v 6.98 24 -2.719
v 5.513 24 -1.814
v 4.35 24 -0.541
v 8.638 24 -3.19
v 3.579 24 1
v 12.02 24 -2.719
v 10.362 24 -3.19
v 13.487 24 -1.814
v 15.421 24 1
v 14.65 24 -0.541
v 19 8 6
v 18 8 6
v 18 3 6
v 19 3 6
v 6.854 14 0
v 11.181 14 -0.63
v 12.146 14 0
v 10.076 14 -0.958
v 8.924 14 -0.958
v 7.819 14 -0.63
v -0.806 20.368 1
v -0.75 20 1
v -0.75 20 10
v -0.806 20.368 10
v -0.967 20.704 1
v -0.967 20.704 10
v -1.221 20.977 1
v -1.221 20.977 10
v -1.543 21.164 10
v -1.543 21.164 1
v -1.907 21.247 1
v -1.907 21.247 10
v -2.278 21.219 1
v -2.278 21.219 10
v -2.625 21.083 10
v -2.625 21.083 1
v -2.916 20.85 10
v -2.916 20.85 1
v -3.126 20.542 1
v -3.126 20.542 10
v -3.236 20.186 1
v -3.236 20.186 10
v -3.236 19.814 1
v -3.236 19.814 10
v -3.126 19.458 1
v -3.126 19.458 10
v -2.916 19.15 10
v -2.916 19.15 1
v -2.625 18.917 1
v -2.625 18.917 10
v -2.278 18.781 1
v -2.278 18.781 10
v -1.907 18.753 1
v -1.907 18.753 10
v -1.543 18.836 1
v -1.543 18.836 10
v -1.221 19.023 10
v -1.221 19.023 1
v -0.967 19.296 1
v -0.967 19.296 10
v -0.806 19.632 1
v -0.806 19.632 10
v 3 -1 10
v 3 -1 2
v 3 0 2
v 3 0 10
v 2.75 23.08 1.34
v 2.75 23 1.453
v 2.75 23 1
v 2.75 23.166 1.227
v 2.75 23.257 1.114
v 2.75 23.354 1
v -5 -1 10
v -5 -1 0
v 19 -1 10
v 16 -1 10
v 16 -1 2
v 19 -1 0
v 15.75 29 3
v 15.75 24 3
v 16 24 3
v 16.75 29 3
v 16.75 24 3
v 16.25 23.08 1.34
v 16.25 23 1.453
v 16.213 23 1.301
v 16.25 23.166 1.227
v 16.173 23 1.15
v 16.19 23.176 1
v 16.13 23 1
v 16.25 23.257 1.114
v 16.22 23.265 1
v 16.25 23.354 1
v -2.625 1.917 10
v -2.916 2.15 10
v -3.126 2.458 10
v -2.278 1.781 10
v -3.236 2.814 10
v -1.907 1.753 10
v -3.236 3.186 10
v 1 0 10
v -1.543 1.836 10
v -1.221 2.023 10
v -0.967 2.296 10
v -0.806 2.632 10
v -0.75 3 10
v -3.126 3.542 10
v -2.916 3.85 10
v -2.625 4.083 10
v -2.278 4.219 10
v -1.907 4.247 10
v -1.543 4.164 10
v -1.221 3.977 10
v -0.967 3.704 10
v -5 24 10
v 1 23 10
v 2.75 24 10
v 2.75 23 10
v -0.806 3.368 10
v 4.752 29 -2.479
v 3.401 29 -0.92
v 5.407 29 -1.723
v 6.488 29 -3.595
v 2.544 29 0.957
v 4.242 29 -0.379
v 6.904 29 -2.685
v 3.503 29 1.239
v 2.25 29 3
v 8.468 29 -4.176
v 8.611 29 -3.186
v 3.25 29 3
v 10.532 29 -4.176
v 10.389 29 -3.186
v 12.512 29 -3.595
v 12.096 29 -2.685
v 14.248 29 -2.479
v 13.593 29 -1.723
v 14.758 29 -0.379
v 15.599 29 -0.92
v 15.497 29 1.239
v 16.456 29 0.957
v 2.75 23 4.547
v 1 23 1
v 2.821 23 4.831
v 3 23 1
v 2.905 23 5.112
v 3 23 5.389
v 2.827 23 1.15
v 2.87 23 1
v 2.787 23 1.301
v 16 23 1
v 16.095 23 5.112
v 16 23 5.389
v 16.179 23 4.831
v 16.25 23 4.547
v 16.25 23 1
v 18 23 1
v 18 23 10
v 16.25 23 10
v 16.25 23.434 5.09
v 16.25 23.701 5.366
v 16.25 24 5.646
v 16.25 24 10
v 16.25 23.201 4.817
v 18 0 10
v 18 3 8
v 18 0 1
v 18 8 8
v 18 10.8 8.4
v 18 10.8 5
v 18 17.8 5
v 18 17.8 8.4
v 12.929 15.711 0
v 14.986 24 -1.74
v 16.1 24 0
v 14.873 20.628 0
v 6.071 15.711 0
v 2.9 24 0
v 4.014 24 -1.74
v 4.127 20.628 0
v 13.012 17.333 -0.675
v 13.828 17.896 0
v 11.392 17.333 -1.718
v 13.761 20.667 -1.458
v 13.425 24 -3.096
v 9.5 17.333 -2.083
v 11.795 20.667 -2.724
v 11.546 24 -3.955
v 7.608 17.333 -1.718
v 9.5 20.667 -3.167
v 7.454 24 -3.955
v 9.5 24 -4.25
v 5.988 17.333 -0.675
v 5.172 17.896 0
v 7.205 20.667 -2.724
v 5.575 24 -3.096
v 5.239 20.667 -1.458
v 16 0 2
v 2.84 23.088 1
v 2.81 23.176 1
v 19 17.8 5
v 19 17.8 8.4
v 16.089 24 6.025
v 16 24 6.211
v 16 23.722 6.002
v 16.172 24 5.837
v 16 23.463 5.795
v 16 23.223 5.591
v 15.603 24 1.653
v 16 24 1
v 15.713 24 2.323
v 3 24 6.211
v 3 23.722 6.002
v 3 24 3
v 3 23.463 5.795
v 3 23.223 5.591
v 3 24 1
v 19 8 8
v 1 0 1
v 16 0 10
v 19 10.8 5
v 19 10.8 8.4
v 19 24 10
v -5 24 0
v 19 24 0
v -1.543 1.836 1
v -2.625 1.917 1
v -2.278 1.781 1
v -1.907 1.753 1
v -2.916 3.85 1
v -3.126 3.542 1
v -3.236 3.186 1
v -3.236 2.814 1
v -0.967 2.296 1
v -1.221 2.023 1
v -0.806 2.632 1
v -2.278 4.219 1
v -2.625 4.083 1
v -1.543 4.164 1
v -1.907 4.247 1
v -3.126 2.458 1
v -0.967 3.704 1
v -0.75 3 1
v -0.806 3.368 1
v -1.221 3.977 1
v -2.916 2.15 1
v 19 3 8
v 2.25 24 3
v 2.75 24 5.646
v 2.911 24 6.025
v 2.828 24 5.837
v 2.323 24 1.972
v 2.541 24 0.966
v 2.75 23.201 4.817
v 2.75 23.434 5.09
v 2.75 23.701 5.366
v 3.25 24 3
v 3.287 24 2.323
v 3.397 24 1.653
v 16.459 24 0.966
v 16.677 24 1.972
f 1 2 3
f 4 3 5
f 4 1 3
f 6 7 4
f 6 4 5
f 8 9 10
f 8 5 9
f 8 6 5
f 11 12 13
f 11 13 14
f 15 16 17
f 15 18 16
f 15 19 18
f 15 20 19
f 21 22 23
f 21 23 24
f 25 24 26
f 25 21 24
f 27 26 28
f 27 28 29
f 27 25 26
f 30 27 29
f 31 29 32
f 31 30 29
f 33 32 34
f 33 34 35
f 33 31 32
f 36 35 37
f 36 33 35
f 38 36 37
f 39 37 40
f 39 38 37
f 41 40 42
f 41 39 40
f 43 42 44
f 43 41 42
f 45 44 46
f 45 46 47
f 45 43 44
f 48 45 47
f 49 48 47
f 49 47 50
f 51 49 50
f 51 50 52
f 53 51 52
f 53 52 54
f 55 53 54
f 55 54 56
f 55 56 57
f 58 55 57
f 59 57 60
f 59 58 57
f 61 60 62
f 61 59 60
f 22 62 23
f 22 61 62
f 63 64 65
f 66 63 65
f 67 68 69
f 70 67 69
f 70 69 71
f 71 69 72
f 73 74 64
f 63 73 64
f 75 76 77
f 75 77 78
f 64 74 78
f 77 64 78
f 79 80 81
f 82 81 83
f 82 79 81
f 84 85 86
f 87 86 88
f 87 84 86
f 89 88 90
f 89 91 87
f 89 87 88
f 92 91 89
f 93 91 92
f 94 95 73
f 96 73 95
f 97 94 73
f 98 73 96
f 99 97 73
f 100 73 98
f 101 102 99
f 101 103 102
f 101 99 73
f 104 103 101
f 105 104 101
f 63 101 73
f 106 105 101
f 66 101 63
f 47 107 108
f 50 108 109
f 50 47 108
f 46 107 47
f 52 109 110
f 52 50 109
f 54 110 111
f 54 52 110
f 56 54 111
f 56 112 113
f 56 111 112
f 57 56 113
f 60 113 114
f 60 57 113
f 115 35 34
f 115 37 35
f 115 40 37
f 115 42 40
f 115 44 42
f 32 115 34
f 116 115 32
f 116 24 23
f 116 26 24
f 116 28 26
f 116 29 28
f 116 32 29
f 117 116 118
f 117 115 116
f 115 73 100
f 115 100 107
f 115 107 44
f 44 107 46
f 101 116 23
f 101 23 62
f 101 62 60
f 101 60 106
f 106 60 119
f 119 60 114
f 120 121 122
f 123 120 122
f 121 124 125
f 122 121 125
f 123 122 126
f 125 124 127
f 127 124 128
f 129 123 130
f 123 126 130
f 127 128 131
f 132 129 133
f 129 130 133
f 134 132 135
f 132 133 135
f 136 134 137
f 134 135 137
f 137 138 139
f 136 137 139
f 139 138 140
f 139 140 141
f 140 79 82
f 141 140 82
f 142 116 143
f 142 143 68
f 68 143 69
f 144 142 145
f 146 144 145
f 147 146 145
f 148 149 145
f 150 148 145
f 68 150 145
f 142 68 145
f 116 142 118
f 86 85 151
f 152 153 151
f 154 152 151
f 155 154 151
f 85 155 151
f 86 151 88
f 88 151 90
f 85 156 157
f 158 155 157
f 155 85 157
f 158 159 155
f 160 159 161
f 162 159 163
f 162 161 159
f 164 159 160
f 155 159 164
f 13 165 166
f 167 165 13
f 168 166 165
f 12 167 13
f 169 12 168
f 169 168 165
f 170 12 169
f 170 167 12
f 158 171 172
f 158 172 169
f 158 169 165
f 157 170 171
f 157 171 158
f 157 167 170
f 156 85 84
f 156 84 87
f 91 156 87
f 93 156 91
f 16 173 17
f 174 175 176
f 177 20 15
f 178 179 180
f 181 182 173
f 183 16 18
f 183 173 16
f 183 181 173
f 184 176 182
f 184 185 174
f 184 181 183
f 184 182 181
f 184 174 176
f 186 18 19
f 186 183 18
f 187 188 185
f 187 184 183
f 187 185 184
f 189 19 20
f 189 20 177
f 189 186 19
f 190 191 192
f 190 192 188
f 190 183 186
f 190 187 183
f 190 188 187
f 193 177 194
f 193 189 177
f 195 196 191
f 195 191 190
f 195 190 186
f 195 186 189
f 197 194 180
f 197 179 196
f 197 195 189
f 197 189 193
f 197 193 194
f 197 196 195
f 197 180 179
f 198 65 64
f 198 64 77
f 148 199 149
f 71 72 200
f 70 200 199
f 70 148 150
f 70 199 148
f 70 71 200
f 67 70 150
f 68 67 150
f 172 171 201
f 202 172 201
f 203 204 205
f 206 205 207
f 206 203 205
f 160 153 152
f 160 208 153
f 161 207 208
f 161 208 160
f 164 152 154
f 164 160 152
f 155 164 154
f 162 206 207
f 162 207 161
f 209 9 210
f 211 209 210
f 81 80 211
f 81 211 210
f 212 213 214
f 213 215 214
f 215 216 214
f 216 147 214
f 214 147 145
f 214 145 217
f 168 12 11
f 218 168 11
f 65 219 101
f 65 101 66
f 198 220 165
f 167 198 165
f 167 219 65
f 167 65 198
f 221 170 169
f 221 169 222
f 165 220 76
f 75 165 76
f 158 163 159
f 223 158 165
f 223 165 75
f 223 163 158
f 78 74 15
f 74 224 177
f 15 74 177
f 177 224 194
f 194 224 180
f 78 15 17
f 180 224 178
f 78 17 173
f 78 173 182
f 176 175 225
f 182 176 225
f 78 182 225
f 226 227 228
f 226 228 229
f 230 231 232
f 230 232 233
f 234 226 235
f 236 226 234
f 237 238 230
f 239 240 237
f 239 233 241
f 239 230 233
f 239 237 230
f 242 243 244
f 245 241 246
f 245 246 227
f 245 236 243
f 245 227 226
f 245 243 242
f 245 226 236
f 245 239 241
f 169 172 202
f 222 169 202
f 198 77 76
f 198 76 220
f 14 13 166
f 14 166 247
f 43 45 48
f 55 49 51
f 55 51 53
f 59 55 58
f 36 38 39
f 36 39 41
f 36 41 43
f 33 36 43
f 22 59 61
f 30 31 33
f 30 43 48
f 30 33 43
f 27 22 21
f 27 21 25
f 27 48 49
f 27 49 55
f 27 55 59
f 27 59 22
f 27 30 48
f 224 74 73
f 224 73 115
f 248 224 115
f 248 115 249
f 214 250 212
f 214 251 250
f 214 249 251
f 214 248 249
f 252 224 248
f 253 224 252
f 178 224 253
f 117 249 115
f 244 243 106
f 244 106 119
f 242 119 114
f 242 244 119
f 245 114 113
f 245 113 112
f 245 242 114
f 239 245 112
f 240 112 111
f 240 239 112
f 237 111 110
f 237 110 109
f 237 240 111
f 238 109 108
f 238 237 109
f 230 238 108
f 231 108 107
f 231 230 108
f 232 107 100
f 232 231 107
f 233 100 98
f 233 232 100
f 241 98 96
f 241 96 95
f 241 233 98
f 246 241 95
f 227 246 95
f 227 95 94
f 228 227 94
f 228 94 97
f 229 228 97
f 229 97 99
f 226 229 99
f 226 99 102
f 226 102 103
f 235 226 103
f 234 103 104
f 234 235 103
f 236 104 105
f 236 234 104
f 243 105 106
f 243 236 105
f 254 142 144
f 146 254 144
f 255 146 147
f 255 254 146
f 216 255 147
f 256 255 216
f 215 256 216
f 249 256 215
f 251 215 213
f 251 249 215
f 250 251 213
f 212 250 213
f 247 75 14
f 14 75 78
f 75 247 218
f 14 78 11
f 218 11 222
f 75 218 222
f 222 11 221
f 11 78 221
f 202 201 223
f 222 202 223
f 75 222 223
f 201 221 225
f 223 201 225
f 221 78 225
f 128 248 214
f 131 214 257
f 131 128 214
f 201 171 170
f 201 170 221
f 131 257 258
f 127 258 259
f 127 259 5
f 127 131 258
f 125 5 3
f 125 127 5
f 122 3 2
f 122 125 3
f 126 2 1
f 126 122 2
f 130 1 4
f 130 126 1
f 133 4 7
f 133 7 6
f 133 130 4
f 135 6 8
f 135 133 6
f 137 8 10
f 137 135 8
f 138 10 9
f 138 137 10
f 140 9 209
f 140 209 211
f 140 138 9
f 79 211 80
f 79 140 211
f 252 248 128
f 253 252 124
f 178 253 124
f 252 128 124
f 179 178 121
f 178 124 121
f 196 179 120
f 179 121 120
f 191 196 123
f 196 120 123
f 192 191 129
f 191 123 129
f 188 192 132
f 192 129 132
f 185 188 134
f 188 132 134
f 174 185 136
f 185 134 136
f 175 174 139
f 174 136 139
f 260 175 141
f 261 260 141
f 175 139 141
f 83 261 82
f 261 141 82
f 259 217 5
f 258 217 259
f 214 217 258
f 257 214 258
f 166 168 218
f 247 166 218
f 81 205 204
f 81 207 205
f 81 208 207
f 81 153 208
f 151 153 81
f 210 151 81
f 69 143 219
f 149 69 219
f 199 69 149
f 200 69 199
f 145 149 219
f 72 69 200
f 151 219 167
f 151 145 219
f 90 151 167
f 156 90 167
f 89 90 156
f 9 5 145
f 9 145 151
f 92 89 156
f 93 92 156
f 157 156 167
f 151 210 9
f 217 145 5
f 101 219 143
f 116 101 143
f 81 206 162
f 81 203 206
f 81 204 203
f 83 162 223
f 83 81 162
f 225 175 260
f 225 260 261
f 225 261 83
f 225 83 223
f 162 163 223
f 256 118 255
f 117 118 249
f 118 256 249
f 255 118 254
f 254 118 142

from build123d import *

# Parameters (mm, degrees)
CYLINDER003_R     = 1.25
CYLINDER003_DEPTH = 9
CYLINDER002_R     = 1.25
CYLINDER002_DEPTH = 9
BOX008_W          = 5
BOX008_H          = 25
BOX008_DEPTH      = 10
BOX009_W          = 5
BOX009_H          = 5
BOX009_DEPTH      = 2
BOX005_W          = 20
BOX005_H          = 10
BOX005_DEPTH      = 10
CYLINDER_R        = 6.25
CYLINDER_DEPTH    = 5
CYLINDER001_R     = 7.25
CYLINDER001_DEPTH = 5
BOX004_W          = 6.5
BOX004_H          = 7
BOX004_DEPTH      = 10
BOX002_W          = 13.5
BOX002_H          = 10
BOX002_DEPTH      = 12
BOX003_W          = 13
BOX003_H          = 13
BOX003_DEPTH      = 12
BOX_W             = 17
BOX_H             = 23
BOX_DEPTH         = 12
BOX001_W          = 19
BOX001_H          = 25
BOX001_DEPTH      = 10
BOX007_W          = 13
BOX007_H          = 10
BOX007_DEPTH      = 10
BOX006_W          = 15
BOX006_H          = 10
BOX006_DEPTH      = 10
BOX010_W          = 1
BOX010_H          = 10
BOX010_DEPTH      = 1.6


with BuildPart() as cylinder003:
    # Cylinder003 → Cylinder003 (new body)
    with BuildSketch(Plane(origin=(-2, 20, 1), x_dir=(1, 0, 0), z_dir=(0, 0, 1))):
        Circle(CYLINDER003_R)
    extrude(amount=CYLINDER003_DEPTH)


with BuildPart() as cylinder002:
    # Cylinder002 → Cylinder002 (new body)
    with BuildSketch(Plane(origin=(-2, 3, 1), x_dir=(1, 0, 0), z_dir=(0, 0, 1))):
        Circle(CYLINDER002_R)
    extrude(amount=CYLINDER002_DEPTH)


with BuildPart() as cube008:
    # Box008 → Box008 (new body)
    with BuildSketch(Plane(origin=(-5, -1, 0), x_dir=(1, 0, 0), z_dir=(0, 0, 1))):
        with Locations((2.5, 12.5)):
            Rectangle(BOX008_W, BOX008_H)
    extrude(amount=BOX008_DEPTH)


with BuildPart() as cube009:
    # Box009 → Box009 (new body)
    with BuildSketch(Plane(origin=(15, 3, 6), x_dir=(1, 0, 0), z_dir=(0, 0, 1))):
        with Locations((2.5, 2.5)):
            Rectangle(BOX009_W, BOX009_H)
    extrude(amount=BOX009_DEPTH)


with BuildPart() as cube005:
    # Box005 → Box005 (new body)
    with BuildSketch(Plane(origin=(0, 24, 3), x_dir=(1, 0, 0), z_dir=(0, 0, 1))):
        with Locations((10, 5)):
            Rectangle(BOX005_W, BOX005_H)
    extrude(amount=BOX005_DEPTH)


with BuildPart() as cylinder:
    # Cylinder → Cylinder (new body)
    with BuildSketch(Plane(origin=(9.5, 29, 3), x_dir=(1, 0, 0), z_dir=(0, -1, 0))):
        Circle(CYLINDER_R)
    extrude(amount=CYLINDER_DEPTH)


with BuildPart() as cut005:
    # Cylinder001 → Cylinder001 (new body)
    with BuildSketch(Plane(origin=(9.5, 29, 3), x_dir=(1, 0, 0), z_dir=(0, -1, 0))):
        Circle(CYLINDER001_R)
    extrude(amount=CYLINDER001_DEPTH)

    # Cut004: cut Cylinder
    add(cylinder.part, mode=Mode.SUBTRACT)

    # Cut005: cut Cube005
    add(cube005.part, mode=Mode.SUBTRACT)


with BuildPart() as cube004:
    # Box004 → Box004 (new body)
    with BuildSketch(Plane(origin=(15, 10.8, 5), x_dir=(1, 0, 0), z_dir=(0, 0, 1))):
        with Locations((3.25, 3.5)):
            Rectangle(BOX004_W, BOX004_H)
    extrude(amount=BOX004_DEPTH)


with BuildPart() as cube002:
    # Box002 → Box002 (new body)
    with BuildSketch(Plane(origin=(2.75, 15, 1), x_dir=(1, 0, 0), z_dir=(0, 0, 1))):
        with Locations((6.75, 5)):
            Rectangle(BOX002_W, BOX002_H)
    extrude(amount=BOX002_DEPTH)


with BuildPart() as cube003:
    # Box003 → Box003 (new body)
    with BuildSketch(Plane(origin=(3, -1, 2), x_dir=(1, 0, 0), z_dir=(0, 0, 1))):
        with Locations((6.5, 6.5)):
            Rectangle(BOX003_W, BOX003_H)
    extrude(amount=BOX003_DEPTH)


with BuildPart() as cube:
    # Box → Box (new body)
    with BuildSketch(Plane(origin=(1, 0, 1), x_dir=(1, 0, 0), z_dir=(0, 0, 1))):
        with Locations((8.5, 11.5)):
            Rectangle(BOX_W, BOX_H)
    extrude(amount=BOX_DEPTH)


with BuildPart() as fusion:
    # Box001 → Box001 (new body)
    with BuildSketch(Plane(origin=(0, -1, 0), x_dir=(1, 0, 0), z_dir=(0, 0, 1))):
        with Locations((9.5, 12.5)):
            Rectangle(BOX001_W, BOX001_H)
    extrude(amount=BOX001_DEPTH)

    # Cut: cut Cube
    add(cube.part, mode=Mode.SUBTRACT)

    # Cut001: cut Cube003
    add(cube003.part, mode=Mode.SUBTRACT)

    # Cut002: cut Cube002
    add(cube002.part, mode=Mode.SUBTRACT)

    # Cut003: cut Cube004
    add(cube004.part, mode=Mode.SUBTRACT)

    # Fusion: union Cut005
    add(cut005.part)


with BuildPart() as cube007:
    # Box007 → Box007 (new body)
    with BuildSketch(Plane(origin=(3, 14, 1), x_dir=(1, 0, 0), z_dir=(0, 0, 1))):
        with Locations((6.5, 5)):
            Rectangle(BOX007_W, BOX007_H)
    extrude(amount=BOX007_DEPTH)


with BuildPart() as cube006:
    # Box006 → Box006 (new body)
    with BuildSketch(Plane(origin=(2, 13, 1), x_dir=(1, 0, 0), z_dir=(0, 0, 1))):
        with Locations((7.5, 5)):
            Rectangle(BOX006_W, BOX006_H)
    extrude(amount=BOX006_DEPTH)


with BuildPart() as cut010:
    # Cone → Cone (revolve)
    with BuildSketch(Plane(origin=(9.5, 14, 3), x_dir=(1, 0, 0), z_dir=(0, 0, 1))):
        Polygon((0, 0), (4, 0), (7.25, 10), (0, 10), align=None)
    revolve(axis=Axis((9.5, 14, 3), (0, 1, 0)))

    # Cut006: cut Cube006
    add(cube006.part, mode=Mode.SUBTRACT)

    # Cut007: cut Cube007
    add(cube007.part, mode=Mode.SUBTRACT)

    # Fusion001: union Fusion
    add(fusion.part)

    # Cut008: cut Cube009
    add(cube009.part, mode=Mode.SUBTRACT)

    # Fusion002: union Cube008
    add(cube008.part)

    # Cut009: cut Cylinder002
    add(cylinder002.part, mode=Mode.SUBTRACT)

    # Cut010: cut Cylinder003
    add(cylinder003.part, mode=Mode.SUBTRACT)


with BuildPart() as fusion003:
    # Box010 → Box010 (new body)
    with BuildSketch(Plane(origin=(18, 10, 8.4), x_dir=(1, 0, 0), z_dir=(0, 0, 1))):
        with Locations((0.5, 5)):
            Rectangle(BOX010_W, BOX010_H)
    extrude(amount=BOX010_DEPTH)

    # Fusion003: union Cut010
    add(cut010.part)


solid = fusion003.part
